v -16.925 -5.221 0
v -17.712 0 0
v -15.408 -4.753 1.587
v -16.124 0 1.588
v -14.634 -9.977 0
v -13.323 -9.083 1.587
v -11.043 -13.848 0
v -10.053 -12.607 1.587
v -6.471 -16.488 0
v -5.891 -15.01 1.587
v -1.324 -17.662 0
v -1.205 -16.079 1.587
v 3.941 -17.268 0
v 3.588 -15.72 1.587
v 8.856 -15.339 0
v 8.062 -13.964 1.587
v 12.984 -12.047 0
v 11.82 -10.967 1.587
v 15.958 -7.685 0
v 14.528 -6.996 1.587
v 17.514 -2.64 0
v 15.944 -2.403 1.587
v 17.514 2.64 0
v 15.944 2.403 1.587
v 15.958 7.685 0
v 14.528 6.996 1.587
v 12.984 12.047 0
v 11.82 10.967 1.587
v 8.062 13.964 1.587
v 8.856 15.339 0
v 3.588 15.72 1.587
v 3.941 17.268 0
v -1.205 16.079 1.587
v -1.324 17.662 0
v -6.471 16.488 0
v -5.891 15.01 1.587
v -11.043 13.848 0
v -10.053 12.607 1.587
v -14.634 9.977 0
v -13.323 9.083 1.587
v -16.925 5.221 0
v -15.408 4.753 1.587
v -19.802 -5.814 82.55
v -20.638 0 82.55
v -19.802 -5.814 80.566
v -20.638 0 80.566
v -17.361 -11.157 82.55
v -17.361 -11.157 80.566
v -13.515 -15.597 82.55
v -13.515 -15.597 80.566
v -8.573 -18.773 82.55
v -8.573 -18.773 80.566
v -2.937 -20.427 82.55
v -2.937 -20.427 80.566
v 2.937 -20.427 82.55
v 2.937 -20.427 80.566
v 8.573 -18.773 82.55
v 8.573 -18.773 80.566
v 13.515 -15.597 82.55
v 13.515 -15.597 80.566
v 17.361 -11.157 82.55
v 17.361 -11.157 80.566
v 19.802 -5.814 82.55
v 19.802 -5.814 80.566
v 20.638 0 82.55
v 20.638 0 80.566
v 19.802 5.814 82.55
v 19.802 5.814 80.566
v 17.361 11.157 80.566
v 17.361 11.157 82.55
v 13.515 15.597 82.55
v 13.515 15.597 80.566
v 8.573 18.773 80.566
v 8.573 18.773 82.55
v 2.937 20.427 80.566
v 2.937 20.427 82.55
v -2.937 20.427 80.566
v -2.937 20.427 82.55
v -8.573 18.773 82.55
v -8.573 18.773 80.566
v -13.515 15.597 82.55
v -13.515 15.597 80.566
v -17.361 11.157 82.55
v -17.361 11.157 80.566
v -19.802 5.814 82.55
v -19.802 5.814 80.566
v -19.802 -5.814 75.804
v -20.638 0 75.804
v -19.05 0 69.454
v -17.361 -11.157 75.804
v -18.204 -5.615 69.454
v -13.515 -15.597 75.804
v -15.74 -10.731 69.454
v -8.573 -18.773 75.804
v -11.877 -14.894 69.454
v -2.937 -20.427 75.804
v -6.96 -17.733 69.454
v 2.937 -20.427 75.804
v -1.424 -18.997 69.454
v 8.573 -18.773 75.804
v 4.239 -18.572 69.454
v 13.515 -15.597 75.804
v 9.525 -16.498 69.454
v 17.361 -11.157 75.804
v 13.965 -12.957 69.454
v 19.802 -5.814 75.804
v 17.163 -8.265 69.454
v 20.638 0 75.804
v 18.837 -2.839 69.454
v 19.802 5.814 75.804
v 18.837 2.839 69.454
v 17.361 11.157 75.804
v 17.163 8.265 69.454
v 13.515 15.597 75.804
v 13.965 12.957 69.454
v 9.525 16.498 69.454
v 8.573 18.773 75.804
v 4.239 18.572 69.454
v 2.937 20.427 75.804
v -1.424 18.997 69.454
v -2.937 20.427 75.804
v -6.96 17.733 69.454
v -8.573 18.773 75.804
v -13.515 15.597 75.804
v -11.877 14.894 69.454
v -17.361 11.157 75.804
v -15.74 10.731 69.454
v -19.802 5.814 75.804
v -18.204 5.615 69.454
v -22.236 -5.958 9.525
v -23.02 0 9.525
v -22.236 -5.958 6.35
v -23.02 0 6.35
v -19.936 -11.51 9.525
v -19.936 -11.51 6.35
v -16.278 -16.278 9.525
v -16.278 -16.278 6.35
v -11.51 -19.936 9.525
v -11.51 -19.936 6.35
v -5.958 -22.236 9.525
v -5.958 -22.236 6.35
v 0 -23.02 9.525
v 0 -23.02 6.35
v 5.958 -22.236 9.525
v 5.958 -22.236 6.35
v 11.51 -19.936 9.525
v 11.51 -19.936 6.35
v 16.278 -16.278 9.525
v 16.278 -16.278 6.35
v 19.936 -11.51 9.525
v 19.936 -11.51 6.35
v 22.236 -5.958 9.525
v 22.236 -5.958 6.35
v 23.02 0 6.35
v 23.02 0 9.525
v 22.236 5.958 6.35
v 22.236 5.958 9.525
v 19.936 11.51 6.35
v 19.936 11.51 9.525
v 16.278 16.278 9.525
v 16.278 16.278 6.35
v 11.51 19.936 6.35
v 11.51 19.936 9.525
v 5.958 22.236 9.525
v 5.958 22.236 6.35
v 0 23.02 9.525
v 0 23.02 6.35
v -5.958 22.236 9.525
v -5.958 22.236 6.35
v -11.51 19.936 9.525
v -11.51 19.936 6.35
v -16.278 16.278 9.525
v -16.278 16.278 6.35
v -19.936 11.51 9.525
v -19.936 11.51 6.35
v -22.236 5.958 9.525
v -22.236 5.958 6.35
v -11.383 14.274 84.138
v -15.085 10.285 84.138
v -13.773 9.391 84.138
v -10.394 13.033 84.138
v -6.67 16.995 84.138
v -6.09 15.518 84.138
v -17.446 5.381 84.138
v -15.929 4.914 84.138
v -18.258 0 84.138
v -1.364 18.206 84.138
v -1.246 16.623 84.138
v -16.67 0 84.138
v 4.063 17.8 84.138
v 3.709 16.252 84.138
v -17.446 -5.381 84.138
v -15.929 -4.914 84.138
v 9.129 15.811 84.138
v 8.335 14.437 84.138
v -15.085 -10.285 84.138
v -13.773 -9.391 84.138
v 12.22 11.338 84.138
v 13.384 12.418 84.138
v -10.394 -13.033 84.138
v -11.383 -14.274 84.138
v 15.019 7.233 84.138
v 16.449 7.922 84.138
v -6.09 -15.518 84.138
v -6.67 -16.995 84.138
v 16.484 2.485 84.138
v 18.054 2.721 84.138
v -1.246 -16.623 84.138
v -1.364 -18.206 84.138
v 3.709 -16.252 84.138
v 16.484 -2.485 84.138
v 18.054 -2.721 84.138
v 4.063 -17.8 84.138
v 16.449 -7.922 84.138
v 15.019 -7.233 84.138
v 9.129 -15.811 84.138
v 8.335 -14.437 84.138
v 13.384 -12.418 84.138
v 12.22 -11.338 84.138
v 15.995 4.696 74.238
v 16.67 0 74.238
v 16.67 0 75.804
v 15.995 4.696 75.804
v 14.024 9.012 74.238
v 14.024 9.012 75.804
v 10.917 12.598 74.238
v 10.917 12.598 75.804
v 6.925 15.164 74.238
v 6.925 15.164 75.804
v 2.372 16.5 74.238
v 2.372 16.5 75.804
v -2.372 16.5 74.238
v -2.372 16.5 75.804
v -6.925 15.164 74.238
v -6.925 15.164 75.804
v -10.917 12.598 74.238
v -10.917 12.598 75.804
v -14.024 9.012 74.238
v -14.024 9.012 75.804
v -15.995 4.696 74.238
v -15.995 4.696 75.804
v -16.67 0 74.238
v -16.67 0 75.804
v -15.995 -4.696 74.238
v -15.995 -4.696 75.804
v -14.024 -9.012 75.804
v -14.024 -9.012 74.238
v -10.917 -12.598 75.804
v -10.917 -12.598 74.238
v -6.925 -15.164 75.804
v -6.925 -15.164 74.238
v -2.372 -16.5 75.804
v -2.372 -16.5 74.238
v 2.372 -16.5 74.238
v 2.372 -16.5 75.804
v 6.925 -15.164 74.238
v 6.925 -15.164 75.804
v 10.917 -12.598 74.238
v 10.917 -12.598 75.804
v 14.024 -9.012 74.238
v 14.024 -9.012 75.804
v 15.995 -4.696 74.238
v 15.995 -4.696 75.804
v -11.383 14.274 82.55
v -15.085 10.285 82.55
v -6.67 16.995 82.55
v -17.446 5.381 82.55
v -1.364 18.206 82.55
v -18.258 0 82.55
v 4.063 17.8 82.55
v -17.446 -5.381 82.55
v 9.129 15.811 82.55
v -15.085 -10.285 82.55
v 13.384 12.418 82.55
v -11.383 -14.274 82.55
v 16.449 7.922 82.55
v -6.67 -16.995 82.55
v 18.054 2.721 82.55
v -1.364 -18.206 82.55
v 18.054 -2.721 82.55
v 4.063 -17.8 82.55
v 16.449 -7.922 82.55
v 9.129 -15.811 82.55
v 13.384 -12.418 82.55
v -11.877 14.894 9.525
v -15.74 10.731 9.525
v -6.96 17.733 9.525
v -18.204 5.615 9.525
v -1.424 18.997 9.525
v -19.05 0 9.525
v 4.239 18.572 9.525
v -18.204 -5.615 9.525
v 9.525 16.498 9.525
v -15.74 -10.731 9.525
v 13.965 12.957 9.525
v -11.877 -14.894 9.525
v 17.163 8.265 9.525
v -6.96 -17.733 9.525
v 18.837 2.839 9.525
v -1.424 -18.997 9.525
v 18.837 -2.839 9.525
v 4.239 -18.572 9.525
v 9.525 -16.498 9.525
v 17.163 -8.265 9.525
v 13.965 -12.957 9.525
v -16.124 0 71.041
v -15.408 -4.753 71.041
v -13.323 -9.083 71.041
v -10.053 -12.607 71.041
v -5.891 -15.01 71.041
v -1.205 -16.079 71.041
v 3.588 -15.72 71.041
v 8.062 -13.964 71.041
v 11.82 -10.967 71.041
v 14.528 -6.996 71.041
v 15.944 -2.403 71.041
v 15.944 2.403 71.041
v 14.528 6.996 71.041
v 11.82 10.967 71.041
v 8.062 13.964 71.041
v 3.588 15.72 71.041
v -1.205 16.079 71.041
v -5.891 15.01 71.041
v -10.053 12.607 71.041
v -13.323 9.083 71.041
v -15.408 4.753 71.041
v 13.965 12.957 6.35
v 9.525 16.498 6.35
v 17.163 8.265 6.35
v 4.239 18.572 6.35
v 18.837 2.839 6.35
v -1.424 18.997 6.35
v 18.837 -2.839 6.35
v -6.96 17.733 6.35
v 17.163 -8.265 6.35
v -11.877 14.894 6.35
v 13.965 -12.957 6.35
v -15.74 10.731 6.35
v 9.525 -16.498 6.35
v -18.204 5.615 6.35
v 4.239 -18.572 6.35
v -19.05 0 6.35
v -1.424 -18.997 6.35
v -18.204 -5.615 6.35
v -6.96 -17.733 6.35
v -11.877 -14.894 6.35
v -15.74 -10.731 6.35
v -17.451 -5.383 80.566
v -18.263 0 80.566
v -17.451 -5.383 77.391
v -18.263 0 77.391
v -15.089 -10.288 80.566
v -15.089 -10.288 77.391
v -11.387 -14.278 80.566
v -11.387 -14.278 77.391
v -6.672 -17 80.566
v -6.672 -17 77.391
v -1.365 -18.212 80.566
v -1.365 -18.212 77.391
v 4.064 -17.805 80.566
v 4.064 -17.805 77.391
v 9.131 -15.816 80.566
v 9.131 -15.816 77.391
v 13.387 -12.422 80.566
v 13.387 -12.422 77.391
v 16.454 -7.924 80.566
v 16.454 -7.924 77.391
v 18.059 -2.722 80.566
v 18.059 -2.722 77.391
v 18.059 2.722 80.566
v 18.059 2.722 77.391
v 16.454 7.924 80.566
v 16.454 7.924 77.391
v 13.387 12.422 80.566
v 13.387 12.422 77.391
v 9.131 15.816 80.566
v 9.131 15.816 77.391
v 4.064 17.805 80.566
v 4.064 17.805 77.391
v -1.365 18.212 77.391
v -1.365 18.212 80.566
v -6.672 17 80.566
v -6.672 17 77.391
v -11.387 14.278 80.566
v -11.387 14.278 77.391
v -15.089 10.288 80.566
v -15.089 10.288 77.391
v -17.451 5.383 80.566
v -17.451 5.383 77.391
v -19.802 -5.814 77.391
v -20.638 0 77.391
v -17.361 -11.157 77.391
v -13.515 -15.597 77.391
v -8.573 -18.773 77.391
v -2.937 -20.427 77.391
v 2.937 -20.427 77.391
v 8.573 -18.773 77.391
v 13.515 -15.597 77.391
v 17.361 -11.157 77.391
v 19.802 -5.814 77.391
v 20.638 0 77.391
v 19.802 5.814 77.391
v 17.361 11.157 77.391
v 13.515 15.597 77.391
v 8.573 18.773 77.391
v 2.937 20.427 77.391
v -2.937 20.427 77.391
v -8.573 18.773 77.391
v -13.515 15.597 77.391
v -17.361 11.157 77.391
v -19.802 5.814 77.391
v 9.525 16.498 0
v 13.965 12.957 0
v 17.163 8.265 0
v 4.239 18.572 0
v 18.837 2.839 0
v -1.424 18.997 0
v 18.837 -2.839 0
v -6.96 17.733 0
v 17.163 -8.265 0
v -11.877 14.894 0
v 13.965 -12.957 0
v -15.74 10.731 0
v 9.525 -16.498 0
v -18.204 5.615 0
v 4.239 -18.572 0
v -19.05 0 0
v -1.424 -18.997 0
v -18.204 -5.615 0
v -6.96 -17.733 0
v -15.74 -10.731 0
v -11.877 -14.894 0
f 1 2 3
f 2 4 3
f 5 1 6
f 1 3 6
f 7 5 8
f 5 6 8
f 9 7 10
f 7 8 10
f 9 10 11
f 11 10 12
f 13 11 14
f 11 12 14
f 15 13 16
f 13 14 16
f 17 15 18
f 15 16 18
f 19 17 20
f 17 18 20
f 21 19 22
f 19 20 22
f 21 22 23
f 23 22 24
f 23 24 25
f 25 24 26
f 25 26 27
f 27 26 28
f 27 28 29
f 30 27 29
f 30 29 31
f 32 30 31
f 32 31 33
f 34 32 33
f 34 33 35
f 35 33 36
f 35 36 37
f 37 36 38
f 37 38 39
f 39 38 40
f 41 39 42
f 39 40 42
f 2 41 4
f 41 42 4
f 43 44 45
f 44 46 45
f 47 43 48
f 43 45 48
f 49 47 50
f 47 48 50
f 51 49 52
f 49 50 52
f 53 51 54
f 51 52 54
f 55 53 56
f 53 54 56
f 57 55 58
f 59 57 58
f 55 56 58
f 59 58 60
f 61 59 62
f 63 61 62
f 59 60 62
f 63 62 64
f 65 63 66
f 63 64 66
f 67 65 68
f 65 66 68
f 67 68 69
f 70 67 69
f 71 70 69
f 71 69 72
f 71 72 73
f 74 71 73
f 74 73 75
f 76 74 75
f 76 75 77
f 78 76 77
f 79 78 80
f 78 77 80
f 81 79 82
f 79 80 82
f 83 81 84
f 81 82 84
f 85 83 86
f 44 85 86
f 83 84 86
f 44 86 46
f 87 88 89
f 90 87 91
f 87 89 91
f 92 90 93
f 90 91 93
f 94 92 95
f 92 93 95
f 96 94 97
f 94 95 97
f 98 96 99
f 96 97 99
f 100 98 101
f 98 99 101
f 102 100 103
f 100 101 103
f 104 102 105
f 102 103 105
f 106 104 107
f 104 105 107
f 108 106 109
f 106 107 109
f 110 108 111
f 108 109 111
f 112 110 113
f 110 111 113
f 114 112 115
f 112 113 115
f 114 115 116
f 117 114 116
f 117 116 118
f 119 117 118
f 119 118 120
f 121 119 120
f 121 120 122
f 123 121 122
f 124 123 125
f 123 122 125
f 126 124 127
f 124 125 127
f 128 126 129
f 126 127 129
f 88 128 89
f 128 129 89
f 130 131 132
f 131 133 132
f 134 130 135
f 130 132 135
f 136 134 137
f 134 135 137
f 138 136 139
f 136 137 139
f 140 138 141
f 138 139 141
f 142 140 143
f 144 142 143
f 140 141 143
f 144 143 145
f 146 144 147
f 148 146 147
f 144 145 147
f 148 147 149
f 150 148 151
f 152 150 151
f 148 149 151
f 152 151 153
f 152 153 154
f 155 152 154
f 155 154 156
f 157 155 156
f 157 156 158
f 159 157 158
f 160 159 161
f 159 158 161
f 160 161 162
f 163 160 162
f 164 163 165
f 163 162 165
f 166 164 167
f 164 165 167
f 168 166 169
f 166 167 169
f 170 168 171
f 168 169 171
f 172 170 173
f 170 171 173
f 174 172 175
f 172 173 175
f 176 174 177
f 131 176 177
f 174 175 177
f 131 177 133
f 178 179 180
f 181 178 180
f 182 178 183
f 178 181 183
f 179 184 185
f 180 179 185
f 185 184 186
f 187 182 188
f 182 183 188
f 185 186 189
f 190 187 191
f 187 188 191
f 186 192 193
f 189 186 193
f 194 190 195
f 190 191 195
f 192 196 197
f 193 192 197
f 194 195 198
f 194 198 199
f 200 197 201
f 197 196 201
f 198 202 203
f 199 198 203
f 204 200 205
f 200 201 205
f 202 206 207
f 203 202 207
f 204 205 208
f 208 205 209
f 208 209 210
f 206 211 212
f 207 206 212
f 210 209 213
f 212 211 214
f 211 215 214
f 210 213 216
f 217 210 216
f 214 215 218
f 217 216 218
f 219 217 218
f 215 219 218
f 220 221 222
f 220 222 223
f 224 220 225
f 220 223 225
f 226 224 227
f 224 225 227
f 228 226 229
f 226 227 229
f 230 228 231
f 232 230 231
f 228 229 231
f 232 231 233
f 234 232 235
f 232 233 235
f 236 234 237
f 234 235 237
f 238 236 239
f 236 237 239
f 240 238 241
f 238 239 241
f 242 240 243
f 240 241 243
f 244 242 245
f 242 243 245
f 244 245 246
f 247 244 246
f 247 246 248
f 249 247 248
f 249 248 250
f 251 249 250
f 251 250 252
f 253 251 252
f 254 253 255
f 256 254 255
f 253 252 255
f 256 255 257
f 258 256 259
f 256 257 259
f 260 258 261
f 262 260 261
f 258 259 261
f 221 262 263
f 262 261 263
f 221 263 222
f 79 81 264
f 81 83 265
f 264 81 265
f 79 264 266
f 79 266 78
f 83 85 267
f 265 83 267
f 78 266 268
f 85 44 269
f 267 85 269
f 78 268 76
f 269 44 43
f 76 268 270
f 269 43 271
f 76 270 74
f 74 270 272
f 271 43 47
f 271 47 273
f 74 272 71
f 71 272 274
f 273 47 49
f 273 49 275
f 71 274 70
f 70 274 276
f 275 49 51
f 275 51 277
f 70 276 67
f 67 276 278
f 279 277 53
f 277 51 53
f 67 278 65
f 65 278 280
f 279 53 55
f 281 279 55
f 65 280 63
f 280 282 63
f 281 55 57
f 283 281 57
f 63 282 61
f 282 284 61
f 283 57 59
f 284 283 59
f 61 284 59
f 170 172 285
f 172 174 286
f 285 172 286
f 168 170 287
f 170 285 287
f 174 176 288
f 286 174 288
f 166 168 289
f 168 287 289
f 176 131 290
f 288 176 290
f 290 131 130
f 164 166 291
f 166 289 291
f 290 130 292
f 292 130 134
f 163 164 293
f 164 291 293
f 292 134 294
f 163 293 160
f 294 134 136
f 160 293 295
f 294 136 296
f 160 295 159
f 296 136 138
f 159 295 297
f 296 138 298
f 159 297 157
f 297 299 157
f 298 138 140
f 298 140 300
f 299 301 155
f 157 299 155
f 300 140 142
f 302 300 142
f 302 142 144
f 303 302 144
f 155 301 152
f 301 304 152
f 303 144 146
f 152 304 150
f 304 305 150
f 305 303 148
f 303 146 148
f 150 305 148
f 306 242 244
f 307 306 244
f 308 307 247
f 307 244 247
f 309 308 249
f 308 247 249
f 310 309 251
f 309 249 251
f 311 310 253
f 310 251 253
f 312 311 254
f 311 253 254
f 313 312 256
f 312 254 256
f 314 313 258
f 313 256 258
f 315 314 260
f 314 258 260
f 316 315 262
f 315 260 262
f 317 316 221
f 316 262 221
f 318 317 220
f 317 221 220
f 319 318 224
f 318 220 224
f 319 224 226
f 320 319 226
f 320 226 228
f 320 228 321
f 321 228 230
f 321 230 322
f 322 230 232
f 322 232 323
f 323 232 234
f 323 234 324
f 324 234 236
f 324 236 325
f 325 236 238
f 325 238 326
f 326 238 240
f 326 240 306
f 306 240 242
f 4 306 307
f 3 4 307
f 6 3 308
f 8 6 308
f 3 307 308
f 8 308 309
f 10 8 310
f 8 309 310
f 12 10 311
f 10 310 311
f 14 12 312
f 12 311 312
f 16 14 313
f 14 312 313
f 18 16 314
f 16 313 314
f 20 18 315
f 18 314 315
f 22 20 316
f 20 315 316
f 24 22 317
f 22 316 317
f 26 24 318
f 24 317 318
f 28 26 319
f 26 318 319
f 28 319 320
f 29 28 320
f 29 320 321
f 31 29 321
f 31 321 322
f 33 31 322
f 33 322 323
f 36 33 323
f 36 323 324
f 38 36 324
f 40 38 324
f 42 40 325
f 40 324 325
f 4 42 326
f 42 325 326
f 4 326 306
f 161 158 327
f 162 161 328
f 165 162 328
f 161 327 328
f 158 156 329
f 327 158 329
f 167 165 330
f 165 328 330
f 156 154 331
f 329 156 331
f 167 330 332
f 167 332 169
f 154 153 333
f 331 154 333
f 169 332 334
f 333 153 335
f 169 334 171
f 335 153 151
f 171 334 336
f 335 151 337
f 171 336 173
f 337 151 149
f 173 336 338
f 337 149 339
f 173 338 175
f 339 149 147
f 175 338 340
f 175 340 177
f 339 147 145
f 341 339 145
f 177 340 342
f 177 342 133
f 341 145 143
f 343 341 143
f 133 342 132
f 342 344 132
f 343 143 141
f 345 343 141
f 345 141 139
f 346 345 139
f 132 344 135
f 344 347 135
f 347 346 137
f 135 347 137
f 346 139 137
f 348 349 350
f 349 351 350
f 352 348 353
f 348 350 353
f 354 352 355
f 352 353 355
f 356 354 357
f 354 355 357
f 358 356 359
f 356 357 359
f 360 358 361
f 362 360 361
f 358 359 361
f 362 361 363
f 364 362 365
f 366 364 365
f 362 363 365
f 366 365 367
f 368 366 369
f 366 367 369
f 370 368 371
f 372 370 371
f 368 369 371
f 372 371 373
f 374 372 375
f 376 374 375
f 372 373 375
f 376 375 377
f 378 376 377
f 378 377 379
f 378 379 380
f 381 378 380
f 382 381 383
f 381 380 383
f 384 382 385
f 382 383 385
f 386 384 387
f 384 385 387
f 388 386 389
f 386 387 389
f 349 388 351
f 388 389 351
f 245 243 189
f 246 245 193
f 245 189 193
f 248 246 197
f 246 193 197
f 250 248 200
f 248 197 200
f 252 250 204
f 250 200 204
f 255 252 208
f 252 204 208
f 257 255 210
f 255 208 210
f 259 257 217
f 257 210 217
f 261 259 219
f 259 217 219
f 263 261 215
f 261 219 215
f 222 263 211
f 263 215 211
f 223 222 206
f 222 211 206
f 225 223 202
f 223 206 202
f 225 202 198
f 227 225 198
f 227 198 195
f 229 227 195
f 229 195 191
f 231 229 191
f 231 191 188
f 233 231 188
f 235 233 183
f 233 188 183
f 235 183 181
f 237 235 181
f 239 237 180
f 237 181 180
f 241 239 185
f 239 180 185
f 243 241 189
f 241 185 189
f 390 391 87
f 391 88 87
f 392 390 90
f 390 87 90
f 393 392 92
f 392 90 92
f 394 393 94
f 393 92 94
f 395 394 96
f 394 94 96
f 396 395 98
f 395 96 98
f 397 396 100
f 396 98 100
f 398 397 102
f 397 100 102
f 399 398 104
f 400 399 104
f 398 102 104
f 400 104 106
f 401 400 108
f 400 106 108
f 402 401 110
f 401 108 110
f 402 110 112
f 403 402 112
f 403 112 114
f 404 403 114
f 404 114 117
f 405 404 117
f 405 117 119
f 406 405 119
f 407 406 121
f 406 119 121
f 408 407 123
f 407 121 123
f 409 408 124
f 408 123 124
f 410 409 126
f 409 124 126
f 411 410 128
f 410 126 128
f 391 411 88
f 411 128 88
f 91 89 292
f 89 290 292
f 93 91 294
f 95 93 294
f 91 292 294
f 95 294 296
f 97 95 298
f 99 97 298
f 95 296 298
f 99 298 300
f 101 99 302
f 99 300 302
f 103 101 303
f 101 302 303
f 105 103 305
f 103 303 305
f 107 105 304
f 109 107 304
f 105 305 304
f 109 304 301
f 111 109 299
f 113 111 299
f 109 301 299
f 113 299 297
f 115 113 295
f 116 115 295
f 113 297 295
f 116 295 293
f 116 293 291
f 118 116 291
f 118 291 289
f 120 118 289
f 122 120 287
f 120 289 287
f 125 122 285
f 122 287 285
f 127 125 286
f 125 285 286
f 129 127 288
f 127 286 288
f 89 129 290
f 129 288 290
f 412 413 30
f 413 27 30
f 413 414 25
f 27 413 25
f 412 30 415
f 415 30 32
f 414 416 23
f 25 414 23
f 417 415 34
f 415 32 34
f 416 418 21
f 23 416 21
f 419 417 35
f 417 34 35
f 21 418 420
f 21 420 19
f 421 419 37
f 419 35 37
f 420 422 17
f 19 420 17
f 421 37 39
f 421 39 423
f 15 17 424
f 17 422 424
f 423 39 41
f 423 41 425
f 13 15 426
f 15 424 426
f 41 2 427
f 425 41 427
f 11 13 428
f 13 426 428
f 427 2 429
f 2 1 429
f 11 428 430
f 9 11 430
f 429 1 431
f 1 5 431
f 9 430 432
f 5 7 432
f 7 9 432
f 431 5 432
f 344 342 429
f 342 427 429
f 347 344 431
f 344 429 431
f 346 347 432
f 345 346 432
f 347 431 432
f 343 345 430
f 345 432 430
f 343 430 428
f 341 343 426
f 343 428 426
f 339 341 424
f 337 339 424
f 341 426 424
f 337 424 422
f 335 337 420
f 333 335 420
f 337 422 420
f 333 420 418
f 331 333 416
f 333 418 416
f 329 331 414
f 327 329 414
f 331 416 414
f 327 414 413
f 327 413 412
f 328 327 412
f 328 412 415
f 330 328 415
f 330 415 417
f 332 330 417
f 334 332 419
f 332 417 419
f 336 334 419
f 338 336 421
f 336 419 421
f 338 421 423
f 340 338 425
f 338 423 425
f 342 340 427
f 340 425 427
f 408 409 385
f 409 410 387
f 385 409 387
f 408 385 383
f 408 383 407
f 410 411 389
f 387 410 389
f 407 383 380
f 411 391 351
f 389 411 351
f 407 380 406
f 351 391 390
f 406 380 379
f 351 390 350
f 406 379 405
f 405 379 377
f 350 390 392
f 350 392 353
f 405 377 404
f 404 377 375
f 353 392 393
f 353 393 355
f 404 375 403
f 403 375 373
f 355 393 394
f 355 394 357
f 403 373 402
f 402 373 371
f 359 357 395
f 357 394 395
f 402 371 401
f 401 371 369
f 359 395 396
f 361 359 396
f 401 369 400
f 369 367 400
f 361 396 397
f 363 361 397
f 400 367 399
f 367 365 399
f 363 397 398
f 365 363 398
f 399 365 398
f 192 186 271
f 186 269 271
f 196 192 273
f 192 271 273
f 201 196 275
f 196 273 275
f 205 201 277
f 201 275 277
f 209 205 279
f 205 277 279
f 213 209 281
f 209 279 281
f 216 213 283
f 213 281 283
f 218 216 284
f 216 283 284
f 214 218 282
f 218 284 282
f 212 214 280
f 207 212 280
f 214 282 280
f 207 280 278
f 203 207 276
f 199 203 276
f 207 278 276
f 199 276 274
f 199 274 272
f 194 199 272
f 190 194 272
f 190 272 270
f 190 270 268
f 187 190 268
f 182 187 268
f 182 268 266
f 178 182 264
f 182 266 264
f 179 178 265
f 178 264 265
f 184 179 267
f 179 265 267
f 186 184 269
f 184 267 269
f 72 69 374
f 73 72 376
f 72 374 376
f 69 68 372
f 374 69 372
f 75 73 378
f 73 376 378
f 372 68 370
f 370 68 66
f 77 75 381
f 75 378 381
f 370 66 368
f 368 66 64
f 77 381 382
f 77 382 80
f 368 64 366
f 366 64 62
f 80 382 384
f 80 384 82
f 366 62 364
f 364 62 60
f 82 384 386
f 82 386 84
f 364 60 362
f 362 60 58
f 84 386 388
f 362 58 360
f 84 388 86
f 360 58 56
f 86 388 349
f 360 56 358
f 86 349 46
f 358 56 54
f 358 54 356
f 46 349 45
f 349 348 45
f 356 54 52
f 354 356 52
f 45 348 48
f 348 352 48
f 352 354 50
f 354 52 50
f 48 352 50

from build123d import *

# Parameters (mm, degrees)
F2_S5_R     = 16.67002
F2_T6_DEPTH = 26


# Not quite as in the source:
# - a fillet or chamfer that OpenCascade refuses, or shapes differently, is made with other operations: its cross-section is extruded or revolved along the edge and cut away or added


with BuildPart() as f1:
    # F0 (on Front) → F1 (revolve)
    with BuildSketch(Plane.XZ):
        Polygon((-17.7118646965, 0), (-16.1243646965, 1.5875), (-16.1243646965, 75.80376), (-16.67002, 75.80376), (-16.67002, 84.1375), (-18.25752, 84.1375), (-18.25752, 82.55), (-20.6375, 82.55), (-20.6375, 80.56626), (-18.2626, 80.56626), (-18.2626, 77.39126), (-20.6375, 77.39126), (-20.6375, 75.80376), (-19.05, 69.45376), (-19.05, 9.525), (-23.02002, 9.525), (-23.02002, 6.35), (-19.05, 6.35), (-19.05, 0), align=None)
    revolve(axis=Axis((0, 0, 38.1), (0, 0, 1)))

    # F2: chamfer of 0.8128 x 4.7625 on 1 edges, made by hand


with BuildPart() as f2_tool2:
    # F2_s3 → F2_t4 (revolve)
    with BuildSketch(Plane.XZ):
        Polygon((-16.1243646965, 71.04126), (-16.9371646965, 75.80376), (-16.1243646965, 75.80376), align=None)
    revolve(axis=Axis((0, 0, 75.80376), (0, 0, 1)))

    # F2_s5 → F2_t6 (intersect, symmetric)
    with BuildSketch(Plane.XY.offset(73.4)):
        Circle(F2_S5_R)
    extrude(amount=F2_T6_DEPTH, both=True, mode=Mode.INTERSECT)


with BuildPart() as f1_1:
    add(f1.part)

    # F2_t1: cut F2_tool2
    add(f2_tool2.part, mode=Mode.SUBTRACT)


solid = f1_1.part
